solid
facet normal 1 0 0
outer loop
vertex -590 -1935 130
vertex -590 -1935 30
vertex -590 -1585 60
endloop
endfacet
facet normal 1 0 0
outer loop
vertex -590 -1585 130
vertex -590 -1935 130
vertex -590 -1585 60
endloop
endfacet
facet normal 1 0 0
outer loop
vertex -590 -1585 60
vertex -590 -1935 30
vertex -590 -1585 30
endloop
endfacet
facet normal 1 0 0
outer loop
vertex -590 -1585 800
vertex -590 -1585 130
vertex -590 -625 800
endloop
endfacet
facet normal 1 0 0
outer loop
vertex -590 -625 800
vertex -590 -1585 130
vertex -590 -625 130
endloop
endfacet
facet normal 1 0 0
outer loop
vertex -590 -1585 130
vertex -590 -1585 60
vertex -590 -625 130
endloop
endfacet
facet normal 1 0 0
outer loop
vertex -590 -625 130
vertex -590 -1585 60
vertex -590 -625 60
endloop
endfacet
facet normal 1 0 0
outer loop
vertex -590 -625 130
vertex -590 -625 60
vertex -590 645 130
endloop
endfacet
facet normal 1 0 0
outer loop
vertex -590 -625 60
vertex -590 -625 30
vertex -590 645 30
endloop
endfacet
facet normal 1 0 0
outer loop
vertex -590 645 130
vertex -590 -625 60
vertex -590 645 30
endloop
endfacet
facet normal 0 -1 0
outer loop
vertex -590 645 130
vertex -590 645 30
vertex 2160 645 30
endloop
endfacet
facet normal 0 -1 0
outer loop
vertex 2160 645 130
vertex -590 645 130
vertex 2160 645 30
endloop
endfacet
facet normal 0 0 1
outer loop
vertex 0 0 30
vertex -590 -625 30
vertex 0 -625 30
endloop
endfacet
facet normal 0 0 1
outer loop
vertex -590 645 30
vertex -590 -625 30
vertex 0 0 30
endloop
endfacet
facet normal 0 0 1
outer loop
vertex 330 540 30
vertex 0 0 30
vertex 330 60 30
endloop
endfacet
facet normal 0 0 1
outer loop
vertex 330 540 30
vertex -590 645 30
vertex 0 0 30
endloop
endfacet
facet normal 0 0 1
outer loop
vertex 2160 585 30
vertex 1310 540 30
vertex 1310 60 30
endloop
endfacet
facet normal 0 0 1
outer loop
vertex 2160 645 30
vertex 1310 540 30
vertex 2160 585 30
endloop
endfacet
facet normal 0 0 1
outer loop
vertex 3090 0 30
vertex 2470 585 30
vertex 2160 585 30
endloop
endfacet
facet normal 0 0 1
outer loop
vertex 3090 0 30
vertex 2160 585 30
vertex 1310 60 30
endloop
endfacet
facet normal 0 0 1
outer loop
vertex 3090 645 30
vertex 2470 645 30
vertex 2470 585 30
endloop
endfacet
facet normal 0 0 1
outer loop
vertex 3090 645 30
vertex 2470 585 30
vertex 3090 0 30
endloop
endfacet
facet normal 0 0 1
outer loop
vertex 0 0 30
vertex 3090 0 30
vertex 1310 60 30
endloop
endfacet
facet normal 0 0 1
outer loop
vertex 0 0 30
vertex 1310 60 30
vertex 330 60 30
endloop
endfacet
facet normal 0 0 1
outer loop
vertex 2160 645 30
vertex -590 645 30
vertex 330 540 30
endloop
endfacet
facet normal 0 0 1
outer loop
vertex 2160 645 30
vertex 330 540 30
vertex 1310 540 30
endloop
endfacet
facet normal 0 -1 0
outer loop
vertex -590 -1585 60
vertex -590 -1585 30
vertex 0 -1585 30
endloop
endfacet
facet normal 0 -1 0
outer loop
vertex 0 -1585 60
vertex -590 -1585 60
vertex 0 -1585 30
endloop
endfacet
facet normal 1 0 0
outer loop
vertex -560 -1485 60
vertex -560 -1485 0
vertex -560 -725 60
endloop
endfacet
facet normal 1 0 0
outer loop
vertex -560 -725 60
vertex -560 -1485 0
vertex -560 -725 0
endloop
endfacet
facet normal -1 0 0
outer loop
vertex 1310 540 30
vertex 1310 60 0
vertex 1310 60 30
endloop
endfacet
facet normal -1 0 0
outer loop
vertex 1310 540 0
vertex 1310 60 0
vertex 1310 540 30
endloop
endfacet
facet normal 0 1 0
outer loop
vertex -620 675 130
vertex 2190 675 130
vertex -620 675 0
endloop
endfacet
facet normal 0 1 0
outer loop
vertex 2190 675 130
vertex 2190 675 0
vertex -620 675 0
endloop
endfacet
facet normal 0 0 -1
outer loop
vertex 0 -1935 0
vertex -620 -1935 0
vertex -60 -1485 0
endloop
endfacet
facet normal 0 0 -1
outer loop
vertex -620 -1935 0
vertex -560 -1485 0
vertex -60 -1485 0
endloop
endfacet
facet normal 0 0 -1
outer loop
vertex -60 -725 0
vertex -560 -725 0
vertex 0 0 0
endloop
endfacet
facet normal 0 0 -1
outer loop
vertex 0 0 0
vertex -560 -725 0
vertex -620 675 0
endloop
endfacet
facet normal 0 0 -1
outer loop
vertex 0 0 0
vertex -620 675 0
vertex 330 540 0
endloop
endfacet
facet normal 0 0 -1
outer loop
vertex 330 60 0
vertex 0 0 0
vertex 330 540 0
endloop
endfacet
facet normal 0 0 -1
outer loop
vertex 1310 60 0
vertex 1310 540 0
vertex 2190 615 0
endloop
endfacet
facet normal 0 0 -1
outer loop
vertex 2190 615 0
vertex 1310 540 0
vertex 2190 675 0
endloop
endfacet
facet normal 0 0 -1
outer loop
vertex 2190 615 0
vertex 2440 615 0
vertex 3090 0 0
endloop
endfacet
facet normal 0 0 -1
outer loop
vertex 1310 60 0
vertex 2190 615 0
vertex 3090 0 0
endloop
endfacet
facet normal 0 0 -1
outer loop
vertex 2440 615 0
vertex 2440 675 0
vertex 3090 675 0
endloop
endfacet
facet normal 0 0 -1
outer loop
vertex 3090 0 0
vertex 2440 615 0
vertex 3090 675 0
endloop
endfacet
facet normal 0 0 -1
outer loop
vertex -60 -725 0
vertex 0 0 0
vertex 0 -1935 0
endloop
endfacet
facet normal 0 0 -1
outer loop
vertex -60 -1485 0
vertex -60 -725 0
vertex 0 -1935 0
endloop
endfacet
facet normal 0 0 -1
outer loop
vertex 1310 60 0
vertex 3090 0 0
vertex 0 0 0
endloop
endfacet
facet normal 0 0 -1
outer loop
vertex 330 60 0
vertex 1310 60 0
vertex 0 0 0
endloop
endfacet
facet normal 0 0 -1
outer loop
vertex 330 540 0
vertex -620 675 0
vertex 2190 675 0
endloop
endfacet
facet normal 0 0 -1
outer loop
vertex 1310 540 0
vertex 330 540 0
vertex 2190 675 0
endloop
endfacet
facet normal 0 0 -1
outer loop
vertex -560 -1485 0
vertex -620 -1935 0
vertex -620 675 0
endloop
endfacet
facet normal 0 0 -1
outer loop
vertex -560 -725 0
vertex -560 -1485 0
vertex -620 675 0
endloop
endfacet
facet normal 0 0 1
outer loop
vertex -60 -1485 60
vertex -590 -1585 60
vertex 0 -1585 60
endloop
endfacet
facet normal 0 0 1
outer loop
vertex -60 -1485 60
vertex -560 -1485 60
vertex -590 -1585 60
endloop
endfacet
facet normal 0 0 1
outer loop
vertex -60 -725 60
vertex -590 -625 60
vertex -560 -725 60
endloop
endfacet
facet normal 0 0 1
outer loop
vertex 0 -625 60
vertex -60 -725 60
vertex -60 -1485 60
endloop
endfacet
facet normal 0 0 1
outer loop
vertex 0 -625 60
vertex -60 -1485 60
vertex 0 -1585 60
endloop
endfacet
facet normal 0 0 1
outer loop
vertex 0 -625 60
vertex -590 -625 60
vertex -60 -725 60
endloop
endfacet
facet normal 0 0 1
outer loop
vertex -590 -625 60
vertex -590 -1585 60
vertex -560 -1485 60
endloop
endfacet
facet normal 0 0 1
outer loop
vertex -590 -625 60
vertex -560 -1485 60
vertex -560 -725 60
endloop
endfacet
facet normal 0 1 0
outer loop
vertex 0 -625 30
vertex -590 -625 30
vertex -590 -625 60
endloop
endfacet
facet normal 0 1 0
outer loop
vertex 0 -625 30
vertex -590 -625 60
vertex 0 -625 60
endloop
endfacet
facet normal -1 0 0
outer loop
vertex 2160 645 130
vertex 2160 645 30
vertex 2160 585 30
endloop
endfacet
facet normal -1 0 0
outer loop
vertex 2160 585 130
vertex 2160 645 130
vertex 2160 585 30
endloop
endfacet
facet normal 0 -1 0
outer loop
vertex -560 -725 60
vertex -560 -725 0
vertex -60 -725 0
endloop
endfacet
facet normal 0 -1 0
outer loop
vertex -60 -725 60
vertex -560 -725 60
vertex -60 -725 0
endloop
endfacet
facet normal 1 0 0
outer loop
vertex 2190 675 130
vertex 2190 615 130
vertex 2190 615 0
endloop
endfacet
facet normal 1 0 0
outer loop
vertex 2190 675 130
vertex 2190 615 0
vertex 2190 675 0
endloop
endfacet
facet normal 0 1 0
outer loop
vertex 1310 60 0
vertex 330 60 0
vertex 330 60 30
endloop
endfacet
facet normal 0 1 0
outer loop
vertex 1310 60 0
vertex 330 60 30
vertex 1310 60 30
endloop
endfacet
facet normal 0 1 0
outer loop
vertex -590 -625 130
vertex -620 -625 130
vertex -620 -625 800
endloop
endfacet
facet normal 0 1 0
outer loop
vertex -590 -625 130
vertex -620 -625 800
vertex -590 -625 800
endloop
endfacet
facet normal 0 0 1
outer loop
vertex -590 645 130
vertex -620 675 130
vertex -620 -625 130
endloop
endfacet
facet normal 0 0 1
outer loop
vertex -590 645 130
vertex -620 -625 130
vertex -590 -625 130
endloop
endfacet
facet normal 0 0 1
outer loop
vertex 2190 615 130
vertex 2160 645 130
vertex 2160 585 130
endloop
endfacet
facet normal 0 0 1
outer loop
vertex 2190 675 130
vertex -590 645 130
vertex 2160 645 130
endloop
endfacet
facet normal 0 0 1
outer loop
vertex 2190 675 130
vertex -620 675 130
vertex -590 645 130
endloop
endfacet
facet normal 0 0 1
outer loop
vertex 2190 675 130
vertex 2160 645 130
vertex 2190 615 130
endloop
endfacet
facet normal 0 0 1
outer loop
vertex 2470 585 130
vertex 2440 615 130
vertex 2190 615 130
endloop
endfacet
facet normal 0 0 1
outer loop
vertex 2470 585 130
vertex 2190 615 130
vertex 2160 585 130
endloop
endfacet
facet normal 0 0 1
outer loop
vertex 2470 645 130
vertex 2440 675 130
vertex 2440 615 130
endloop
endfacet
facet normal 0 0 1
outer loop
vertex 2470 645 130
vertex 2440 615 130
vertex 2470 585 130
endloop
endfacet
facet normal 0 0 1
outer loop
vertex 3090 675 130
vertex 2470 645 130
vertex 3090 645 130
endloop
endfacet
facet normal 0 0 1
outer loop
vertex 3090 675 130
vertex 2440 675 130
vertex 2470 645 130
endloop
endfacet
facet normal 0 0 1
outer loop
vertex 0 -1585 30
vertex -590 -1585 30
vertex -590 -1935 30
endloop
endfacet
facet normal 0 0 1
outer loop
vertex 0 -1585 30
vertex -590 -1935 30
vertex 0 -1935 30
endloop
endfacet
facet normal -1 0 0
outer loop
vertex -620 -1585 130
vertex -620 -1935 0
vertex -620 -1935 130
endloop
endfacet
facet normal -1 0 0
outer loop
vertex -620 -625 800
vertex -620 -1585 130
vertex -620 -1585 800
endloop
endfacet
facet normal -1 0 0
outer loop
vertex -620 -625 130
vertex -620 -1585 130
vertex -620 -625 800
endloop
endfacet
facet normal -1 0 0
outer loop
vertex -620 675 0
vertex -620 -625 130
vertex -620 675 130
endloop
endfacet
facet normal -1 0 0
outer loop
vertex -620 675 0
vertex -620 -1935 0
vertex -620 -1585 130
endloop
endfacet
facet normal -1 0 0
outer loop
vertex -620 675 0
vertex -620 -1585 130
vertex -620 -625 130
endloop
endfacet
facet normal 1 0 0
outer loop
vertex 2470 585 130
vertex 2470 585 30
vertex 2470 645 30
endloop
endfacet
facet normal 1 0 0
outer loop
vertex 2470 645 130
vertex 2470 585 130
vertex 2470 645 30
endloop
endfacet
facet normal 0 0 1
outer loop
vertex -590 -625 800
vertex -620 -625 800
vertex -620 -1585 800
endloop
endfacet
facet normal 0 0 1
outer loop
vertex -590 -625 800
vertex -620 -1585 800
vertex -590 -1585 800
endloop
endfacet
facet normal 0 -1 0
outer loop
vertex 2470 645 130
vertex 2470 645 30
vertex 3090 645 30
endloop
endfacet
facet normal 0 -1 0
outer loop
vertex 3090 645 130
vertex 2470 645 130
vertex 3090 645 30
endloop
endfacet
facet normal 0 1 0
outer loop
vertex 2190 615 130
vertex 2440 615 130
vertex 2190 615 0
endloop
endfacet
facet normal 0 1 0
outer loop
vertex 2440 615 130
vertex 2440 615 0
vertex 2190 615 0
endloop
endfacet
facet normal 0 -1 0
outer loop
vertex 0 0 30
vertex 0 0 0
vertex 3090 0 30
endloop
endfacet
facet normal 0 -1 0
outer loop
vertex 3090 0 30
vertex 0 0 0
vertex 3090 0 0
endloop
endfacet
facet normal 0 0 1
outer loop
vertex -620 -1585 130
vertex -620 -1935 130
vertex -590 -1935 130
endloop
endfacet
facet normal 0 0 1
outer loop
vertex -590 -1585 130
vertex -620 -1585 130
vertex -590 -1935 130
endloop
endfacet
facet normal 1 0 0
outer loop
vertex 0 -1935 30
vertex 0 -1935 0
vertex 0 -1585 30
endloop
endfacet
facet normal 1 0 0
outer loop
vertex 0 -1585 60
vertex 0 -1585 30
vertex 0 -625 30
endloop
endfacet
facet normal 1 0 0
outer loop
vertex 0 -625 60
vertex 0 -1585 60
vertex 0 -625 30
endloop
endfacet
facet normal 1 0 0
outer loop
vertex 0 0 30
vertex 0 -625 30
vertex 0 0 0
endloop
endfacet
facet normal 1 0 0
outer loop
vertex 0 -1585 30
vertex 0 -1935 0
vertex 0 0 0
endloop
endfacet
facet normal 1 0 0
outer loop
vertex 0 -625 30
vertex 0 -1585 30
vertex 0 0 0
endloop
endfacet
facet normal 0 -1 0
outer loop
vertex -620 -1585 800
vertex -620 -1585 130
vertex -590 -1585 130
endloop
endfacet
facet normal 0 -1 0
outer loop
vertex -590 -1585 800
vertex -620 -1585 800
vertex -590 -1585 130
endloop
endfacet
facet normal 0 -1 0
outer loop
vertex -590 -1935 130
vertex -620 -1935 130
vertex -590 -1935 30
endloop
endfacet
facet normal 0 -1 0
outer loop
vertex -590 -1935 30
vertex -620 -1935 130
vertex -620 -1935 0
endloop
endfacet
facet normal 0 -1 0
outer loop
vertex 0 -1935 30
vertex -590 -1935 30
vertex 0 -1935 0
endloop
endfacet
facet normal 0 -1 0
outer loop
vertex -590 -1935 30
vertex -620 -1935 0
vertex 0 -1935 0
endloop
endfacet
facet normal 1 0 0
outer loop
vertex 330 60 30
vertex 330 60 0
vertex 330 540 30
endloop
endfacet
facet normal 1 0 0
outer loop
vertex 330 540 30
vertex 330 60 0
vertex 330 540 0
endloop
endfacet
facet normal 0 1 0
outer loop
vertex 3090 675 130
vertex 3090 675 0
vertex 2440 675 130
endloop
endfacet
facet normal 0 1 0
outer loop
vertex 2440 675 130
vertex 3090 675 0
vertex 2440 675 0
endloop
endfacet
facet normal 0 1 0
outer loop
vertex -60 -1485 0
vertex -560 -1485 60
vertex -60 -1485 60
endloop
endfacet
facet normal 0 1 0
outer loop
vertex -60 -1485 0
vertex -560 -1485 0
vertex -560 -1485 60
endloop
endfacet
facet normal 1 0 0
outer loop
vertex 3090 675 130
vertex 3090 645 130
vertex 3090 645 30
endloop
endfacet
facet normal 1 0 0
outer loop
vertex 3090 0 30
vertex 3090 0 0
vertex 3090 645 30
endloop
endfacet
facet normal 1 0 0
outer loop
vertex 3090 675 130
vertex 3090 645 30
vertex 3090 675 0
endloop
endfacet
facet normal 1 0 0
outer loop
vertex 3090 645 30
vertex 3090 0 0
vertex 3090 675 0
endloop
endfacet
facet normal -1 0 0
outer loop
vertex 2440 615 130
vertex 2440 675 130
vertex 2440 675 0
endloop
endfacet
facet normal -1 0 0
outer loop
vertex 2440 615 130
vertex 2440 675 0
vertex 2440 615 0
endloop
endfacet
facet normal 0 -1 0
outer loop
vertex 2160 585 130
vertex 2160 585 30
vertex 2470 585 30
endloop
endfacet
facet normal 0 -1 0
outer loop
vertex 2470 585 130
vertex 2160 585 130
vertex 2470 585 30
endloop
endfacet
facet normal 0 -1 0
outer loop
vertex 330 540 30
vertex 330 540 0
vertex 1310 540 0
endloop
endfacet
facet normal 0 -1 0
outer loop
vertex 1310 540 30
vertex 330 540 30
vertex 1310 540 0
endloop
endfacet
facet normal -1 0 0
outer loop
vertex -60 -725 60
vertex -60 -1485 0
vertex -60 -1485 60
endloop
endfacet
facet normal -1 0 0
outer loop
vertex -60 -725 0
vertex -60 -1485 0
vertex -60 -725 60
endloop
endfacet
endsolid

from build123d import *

# Parameters (mm, degrees)
F0_W     = 500
F0_H     = 760
F0_W_2   = 980
F0_H_2   = 480
F1_DEPTH = 30
F2_W     = 620
F2_H     = 960
F2_W_2   = 500
F2_H_2   = 760
F3_DEPTH = 30
F4_W     = 30
F4_H     = 960
F5_DEPTH = 740
F6_W     = 30
F6_H     = 30
F6_H_2   = 1270
F7_DEPTH = 100
F8_W     = 30
F8_H     = 350
F9_DEPTH = 100


with BuildPart() as f1:
    # F0 (on Top) → F1 (new body)
    with BuildSketch(Plane.XY):
        Polygon((0, -1935), (0, 0), (3090, 0), (3090, 675), (2440, 675), (2440, 615), (2190, 615), (2190, 675), (-620, 675), (-620, -1935), align=None)
        with Locations((-310, -1105)):
            Rectangle(F0_W, F0_H, mode=Mode.SUBTRACT)
        with Locations((820, 300)):
            Rectangle(F0_W_2, F0_H_2, mode=Mode.SUBTRACT)
    extrude(amount=F1_DEPTH)

    # F2 (on face) → F3 (join)
    with BuildSketch(Plane.XY.offset(30)):
        with Locations((-310, -1105)):
            Rectangle(F2_W, F2_H)
        with Locations((-310, -1105)):
            Rectangle(F2_W_2, F2_H_2, mode=Mode.SUBTRACT)
    extrude(amount=F3_DEPTH)

    # F4 (on face) → F5 (join)
    with BuildSketch(Plane.XY.offset(60)):
        with Locations((-605, -1105)):
            Rectangle(F4_W, F4_H)
    extrude(amount=F5_DEPTH)

    # F6 (on face) → F7 (join)
    with BuildSketch(Plane.XY.offset(30)):
        Polygon((3090, 645), (3090, 675), (2440, 675), (2440, 645), (2470, 645), align=None)
        with Locations((2455, 630)):
            Rectangle(F6_W, F6_H)
        Polygon((2470, 615), (2440, 615), (2190, 615), (2160, 615), (2160, 585), (2470, 585), align=None)
        with Locations((2175, 630)):
            Rectangle(F6_W, F6_H)
        Polygon((2160, 645), (2190, 645), (2190, 675), (-620, 675), (-620, 645), (-590, 645), align=None)
        with Locations((-605, 10)):
            Rectangle(F6_W, F6_H_2)
    extrude(amount=F7_DEPTH)

    # F8 (on face) → F9 (join)
    with BuildSketch(Plane.XY.offset(30)):
        with Locations((-605, -1760)):
            Rectangle(F8_W, F8_H)
    extrude(amount=F9_DEPTH)


solid = f1.part
